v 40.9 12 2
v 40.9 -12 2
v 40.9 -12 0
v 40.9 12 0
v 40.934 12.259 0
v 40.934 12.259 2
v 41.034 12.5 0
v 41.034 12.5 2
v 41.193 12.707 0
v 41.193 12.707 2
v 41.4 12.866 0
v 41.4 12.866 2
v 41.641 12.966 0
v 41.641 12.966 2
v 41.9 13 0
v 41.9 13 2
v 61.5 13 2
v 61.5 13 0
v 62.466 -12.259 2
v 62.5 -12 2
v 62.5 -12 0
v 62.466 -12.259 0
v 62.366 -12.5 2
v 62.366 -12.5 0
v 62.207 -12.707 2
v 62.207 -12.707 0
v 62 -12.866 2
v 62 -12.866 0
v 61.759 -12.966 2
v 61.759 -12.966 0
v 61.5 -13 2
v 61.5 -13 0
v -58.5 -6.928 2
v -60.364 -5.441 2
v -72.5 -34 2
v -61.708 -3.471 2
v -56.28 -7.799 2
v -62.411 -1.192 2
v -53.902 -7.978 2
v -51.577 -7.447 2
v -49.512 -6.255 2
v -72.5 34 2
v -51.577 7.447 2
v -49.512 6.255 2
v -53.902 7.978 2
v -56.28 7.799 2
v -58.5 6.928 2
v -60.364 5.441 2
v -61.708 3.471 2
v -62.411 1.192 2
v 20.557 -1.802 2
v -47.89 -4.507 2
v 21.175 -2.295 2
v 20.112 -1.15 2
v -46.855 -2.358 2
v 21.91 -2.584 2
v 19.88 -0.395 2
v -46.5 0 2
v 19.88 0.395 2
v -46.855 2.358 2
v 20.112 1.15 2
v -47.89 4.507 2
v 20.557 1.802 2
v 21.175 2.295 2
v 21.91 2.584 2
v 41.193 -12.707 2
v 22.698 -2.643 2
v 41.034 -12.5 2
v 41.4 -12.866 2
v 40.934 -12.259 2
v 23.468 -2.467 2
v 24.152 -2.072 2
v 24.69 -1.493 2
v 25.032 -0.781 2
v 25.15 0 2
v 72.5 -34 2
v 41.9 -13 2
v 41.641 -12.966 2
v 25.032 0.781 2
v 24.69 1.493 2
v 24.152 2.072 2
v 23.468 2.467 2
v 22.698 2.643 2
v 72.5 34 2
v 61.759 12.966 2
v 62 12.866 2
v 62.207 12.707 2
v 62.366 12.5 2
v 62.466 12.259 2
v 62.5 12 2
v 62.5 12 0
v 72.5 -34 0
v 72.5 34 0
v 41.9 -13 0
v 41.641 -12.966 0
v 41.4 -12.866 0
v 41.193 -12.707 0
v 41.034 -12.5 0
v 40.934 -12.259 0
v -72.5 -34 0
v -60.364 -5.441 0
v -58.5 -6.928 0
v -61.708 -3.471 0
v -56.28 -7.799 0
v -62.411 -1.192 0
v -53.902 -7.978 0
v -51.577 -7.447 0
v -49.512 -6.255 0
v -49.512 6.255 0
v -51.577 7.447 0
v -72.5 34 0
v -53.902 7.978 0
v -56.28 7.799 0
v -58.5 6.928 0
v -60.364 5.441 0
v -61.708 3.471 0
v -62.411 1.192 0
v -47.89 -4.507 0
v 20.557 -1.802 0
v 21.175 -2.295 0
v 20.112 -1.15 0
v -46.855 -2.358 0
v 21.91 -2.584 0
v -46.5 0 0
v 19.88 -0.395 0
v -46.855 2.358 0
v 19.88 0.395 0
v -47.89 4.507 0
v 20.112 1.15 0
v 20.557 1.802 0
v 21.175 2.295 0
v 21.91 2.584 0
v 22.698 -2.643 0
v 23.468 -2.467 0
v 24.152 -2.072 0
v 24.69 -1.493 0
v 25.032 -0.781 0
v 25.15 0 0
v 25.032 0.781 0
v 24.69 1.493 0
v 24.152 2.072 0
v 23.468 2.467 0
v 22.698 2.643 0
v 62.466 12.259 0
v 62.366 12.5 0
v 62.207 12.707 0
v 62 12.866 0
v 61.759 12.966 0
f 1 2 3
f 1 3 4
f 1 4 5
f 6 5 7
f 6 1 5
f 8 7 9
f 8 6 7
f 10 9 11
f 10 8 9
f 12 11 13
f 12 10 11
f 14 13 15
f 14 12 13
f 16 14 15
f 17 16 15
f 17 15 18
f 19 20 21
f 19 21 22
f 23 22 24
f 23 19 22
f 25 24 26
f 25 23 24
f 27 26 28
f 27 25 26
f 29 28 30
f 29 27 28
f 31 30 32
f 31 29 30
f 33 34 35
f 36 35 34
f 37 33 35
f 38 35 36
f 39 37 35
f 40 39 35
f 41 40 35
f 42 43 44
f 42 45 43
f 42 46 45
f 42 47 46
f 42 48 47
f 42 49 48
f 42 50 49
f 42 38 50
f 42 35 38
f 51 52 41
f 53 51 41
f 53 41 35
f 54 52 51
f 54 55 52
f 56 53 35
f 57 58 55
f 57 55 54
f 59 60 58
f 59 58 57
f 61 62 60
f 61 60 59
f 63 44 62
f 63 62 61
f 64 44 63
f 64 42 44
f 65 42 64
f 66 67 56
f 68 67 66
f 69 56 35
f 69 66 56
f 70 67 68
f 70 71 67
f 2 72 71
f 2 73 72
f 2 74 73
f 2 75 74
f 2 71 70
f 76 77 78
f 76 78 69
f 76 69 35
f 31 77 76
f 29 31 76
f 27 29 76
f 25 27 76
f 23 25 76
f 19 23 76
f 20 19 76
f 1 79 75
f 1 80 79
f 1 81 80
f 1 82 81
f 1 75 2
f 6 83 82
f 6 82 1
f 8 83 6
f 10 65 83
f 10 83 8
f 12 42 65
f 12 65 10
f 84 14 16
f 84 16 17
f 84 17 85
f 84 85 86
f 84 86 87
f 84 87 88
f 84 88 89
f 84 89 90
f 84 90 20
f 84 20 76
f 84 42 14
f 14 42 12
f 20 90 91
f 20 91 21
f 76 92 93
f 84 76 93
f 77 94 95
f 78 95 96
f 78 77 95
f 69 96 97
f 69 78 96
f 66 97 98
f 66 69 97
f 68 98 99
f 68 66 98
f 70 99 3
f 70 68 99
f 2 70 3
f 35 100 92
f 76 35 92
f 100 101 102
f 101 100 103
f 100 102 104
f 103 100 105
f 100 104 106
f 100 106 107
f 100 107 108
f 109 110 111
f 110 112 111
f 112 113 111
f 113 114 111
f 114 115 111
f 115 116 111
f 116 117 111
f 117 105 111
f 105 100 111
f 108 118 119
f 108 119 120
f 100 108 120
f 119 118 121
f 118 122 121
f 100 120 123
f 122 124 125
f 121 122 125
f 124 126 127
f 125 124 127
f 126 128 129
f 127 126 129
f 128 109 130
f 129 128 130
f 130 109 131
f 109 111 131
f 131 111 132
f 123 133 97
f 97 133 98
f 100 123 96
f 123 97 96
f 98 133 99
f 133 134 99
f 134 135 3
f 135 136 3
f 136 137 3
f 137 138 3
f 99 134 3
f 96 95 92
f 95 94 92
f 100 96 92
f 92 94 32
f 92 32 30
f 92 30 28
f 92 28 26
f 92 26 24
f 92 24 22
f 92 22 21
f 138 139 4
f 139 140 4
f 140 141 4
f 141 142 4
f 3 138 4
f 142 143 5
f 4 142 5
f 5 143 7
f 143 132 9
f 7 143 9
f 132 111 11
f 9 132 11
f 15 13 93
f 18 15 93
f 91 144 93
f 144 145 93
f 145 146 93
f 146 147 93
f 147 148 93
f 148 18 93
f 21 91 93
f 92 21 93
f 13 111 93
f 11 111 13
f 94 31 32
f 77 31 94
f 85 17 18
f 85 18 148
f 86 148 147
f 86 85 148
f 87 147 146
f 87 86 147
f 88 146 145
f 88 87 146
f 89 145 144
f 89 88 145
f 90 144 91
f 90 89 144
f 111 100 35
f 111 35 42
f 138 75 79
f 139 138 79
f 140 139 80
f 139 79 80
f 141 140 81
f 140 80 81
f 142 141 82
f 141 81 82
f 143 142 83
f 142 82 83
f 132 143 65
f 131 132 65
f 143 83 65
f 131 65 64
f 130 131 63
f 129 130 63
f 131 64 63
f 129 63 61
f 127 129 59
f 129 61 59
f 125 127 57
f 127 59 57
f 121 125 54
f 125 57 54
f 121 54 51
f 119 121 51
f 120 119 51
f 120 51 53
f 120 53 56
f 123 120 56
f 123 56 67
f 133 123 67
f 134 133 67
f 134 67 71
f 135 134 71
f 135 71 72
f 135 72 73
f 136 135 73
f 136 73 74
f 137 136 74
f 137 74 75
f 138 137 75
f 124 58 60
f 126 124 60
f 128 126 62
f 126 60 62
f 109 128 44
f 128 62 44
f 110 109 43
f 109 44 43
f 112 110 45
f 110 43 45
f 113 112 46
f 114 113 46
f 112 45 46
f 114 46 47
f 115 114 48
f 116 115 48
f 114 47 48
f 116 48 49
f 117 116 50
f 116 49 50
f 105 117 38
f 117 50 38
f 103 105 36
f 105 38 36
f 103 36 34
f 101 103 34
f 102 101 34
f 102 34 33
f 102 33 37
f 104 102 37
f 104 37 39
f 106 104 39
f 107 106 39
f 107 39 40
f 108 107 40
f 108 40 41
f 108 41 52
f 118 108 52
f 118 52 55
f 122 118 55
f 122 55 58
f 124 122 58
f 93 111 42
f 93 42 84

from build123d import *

# Parameters (mm, degrees)
SKETCH1_W           = 145
SKETCH1_H           = 68
BOSS_EXTRUDE1_DEPTH = 2
SKETCH2_R           = 8
SKETCH2_R_2         = 2.65
CUT_EXTRUDE1_DEPTH  = 81.101498113


with BuildPart() as part:
    # Sketch1 → Boss-Extrude1 (new body)
    with BuildSketch(Plane.XY):
        Rectangle(SKETCH1_W, SKETCH1_H)
    extrude(amount=BOSS_EXTRUDE1_DEPTH)

    # Sketch2 → Cut-Extrude1 (cut, through all)
    with BuildSketch(Plane.XY.offset(2)):
        with Locations((-54.5, 0)):
            Circle(SKETCH2_R)
        with Locations((22.5, 0)):
            Circle(SKETCH2_R_2)
        with BuildLine():
            Line((61.5, -13), (41.9, -13))
            ThreePointArc((41.9, -13), (41.192893219, -12.707106781), (40.9, -12))
            Line((40.9, -12), (40.9, 12))
            ThreePointArc((40.9, 12), (41.192893219, 12.707106781), (41.9, 13))
            Line((41.9, 13), (61.5, 13))
            ThreePointArc((61.5, 13), (62.207106781, 12.707106781), (62.5, 12))
            Line((62.5, 12), (62.5, -12))
            ThreePointArc((62.5, -12), (62.207106781, -12.707106781), (61.5, -13))
        make_face()
    extrude(amount=-CUT_EXTRUDE1_DEPTH, mode=Mode.SUBTRACT)


solid = part.part
